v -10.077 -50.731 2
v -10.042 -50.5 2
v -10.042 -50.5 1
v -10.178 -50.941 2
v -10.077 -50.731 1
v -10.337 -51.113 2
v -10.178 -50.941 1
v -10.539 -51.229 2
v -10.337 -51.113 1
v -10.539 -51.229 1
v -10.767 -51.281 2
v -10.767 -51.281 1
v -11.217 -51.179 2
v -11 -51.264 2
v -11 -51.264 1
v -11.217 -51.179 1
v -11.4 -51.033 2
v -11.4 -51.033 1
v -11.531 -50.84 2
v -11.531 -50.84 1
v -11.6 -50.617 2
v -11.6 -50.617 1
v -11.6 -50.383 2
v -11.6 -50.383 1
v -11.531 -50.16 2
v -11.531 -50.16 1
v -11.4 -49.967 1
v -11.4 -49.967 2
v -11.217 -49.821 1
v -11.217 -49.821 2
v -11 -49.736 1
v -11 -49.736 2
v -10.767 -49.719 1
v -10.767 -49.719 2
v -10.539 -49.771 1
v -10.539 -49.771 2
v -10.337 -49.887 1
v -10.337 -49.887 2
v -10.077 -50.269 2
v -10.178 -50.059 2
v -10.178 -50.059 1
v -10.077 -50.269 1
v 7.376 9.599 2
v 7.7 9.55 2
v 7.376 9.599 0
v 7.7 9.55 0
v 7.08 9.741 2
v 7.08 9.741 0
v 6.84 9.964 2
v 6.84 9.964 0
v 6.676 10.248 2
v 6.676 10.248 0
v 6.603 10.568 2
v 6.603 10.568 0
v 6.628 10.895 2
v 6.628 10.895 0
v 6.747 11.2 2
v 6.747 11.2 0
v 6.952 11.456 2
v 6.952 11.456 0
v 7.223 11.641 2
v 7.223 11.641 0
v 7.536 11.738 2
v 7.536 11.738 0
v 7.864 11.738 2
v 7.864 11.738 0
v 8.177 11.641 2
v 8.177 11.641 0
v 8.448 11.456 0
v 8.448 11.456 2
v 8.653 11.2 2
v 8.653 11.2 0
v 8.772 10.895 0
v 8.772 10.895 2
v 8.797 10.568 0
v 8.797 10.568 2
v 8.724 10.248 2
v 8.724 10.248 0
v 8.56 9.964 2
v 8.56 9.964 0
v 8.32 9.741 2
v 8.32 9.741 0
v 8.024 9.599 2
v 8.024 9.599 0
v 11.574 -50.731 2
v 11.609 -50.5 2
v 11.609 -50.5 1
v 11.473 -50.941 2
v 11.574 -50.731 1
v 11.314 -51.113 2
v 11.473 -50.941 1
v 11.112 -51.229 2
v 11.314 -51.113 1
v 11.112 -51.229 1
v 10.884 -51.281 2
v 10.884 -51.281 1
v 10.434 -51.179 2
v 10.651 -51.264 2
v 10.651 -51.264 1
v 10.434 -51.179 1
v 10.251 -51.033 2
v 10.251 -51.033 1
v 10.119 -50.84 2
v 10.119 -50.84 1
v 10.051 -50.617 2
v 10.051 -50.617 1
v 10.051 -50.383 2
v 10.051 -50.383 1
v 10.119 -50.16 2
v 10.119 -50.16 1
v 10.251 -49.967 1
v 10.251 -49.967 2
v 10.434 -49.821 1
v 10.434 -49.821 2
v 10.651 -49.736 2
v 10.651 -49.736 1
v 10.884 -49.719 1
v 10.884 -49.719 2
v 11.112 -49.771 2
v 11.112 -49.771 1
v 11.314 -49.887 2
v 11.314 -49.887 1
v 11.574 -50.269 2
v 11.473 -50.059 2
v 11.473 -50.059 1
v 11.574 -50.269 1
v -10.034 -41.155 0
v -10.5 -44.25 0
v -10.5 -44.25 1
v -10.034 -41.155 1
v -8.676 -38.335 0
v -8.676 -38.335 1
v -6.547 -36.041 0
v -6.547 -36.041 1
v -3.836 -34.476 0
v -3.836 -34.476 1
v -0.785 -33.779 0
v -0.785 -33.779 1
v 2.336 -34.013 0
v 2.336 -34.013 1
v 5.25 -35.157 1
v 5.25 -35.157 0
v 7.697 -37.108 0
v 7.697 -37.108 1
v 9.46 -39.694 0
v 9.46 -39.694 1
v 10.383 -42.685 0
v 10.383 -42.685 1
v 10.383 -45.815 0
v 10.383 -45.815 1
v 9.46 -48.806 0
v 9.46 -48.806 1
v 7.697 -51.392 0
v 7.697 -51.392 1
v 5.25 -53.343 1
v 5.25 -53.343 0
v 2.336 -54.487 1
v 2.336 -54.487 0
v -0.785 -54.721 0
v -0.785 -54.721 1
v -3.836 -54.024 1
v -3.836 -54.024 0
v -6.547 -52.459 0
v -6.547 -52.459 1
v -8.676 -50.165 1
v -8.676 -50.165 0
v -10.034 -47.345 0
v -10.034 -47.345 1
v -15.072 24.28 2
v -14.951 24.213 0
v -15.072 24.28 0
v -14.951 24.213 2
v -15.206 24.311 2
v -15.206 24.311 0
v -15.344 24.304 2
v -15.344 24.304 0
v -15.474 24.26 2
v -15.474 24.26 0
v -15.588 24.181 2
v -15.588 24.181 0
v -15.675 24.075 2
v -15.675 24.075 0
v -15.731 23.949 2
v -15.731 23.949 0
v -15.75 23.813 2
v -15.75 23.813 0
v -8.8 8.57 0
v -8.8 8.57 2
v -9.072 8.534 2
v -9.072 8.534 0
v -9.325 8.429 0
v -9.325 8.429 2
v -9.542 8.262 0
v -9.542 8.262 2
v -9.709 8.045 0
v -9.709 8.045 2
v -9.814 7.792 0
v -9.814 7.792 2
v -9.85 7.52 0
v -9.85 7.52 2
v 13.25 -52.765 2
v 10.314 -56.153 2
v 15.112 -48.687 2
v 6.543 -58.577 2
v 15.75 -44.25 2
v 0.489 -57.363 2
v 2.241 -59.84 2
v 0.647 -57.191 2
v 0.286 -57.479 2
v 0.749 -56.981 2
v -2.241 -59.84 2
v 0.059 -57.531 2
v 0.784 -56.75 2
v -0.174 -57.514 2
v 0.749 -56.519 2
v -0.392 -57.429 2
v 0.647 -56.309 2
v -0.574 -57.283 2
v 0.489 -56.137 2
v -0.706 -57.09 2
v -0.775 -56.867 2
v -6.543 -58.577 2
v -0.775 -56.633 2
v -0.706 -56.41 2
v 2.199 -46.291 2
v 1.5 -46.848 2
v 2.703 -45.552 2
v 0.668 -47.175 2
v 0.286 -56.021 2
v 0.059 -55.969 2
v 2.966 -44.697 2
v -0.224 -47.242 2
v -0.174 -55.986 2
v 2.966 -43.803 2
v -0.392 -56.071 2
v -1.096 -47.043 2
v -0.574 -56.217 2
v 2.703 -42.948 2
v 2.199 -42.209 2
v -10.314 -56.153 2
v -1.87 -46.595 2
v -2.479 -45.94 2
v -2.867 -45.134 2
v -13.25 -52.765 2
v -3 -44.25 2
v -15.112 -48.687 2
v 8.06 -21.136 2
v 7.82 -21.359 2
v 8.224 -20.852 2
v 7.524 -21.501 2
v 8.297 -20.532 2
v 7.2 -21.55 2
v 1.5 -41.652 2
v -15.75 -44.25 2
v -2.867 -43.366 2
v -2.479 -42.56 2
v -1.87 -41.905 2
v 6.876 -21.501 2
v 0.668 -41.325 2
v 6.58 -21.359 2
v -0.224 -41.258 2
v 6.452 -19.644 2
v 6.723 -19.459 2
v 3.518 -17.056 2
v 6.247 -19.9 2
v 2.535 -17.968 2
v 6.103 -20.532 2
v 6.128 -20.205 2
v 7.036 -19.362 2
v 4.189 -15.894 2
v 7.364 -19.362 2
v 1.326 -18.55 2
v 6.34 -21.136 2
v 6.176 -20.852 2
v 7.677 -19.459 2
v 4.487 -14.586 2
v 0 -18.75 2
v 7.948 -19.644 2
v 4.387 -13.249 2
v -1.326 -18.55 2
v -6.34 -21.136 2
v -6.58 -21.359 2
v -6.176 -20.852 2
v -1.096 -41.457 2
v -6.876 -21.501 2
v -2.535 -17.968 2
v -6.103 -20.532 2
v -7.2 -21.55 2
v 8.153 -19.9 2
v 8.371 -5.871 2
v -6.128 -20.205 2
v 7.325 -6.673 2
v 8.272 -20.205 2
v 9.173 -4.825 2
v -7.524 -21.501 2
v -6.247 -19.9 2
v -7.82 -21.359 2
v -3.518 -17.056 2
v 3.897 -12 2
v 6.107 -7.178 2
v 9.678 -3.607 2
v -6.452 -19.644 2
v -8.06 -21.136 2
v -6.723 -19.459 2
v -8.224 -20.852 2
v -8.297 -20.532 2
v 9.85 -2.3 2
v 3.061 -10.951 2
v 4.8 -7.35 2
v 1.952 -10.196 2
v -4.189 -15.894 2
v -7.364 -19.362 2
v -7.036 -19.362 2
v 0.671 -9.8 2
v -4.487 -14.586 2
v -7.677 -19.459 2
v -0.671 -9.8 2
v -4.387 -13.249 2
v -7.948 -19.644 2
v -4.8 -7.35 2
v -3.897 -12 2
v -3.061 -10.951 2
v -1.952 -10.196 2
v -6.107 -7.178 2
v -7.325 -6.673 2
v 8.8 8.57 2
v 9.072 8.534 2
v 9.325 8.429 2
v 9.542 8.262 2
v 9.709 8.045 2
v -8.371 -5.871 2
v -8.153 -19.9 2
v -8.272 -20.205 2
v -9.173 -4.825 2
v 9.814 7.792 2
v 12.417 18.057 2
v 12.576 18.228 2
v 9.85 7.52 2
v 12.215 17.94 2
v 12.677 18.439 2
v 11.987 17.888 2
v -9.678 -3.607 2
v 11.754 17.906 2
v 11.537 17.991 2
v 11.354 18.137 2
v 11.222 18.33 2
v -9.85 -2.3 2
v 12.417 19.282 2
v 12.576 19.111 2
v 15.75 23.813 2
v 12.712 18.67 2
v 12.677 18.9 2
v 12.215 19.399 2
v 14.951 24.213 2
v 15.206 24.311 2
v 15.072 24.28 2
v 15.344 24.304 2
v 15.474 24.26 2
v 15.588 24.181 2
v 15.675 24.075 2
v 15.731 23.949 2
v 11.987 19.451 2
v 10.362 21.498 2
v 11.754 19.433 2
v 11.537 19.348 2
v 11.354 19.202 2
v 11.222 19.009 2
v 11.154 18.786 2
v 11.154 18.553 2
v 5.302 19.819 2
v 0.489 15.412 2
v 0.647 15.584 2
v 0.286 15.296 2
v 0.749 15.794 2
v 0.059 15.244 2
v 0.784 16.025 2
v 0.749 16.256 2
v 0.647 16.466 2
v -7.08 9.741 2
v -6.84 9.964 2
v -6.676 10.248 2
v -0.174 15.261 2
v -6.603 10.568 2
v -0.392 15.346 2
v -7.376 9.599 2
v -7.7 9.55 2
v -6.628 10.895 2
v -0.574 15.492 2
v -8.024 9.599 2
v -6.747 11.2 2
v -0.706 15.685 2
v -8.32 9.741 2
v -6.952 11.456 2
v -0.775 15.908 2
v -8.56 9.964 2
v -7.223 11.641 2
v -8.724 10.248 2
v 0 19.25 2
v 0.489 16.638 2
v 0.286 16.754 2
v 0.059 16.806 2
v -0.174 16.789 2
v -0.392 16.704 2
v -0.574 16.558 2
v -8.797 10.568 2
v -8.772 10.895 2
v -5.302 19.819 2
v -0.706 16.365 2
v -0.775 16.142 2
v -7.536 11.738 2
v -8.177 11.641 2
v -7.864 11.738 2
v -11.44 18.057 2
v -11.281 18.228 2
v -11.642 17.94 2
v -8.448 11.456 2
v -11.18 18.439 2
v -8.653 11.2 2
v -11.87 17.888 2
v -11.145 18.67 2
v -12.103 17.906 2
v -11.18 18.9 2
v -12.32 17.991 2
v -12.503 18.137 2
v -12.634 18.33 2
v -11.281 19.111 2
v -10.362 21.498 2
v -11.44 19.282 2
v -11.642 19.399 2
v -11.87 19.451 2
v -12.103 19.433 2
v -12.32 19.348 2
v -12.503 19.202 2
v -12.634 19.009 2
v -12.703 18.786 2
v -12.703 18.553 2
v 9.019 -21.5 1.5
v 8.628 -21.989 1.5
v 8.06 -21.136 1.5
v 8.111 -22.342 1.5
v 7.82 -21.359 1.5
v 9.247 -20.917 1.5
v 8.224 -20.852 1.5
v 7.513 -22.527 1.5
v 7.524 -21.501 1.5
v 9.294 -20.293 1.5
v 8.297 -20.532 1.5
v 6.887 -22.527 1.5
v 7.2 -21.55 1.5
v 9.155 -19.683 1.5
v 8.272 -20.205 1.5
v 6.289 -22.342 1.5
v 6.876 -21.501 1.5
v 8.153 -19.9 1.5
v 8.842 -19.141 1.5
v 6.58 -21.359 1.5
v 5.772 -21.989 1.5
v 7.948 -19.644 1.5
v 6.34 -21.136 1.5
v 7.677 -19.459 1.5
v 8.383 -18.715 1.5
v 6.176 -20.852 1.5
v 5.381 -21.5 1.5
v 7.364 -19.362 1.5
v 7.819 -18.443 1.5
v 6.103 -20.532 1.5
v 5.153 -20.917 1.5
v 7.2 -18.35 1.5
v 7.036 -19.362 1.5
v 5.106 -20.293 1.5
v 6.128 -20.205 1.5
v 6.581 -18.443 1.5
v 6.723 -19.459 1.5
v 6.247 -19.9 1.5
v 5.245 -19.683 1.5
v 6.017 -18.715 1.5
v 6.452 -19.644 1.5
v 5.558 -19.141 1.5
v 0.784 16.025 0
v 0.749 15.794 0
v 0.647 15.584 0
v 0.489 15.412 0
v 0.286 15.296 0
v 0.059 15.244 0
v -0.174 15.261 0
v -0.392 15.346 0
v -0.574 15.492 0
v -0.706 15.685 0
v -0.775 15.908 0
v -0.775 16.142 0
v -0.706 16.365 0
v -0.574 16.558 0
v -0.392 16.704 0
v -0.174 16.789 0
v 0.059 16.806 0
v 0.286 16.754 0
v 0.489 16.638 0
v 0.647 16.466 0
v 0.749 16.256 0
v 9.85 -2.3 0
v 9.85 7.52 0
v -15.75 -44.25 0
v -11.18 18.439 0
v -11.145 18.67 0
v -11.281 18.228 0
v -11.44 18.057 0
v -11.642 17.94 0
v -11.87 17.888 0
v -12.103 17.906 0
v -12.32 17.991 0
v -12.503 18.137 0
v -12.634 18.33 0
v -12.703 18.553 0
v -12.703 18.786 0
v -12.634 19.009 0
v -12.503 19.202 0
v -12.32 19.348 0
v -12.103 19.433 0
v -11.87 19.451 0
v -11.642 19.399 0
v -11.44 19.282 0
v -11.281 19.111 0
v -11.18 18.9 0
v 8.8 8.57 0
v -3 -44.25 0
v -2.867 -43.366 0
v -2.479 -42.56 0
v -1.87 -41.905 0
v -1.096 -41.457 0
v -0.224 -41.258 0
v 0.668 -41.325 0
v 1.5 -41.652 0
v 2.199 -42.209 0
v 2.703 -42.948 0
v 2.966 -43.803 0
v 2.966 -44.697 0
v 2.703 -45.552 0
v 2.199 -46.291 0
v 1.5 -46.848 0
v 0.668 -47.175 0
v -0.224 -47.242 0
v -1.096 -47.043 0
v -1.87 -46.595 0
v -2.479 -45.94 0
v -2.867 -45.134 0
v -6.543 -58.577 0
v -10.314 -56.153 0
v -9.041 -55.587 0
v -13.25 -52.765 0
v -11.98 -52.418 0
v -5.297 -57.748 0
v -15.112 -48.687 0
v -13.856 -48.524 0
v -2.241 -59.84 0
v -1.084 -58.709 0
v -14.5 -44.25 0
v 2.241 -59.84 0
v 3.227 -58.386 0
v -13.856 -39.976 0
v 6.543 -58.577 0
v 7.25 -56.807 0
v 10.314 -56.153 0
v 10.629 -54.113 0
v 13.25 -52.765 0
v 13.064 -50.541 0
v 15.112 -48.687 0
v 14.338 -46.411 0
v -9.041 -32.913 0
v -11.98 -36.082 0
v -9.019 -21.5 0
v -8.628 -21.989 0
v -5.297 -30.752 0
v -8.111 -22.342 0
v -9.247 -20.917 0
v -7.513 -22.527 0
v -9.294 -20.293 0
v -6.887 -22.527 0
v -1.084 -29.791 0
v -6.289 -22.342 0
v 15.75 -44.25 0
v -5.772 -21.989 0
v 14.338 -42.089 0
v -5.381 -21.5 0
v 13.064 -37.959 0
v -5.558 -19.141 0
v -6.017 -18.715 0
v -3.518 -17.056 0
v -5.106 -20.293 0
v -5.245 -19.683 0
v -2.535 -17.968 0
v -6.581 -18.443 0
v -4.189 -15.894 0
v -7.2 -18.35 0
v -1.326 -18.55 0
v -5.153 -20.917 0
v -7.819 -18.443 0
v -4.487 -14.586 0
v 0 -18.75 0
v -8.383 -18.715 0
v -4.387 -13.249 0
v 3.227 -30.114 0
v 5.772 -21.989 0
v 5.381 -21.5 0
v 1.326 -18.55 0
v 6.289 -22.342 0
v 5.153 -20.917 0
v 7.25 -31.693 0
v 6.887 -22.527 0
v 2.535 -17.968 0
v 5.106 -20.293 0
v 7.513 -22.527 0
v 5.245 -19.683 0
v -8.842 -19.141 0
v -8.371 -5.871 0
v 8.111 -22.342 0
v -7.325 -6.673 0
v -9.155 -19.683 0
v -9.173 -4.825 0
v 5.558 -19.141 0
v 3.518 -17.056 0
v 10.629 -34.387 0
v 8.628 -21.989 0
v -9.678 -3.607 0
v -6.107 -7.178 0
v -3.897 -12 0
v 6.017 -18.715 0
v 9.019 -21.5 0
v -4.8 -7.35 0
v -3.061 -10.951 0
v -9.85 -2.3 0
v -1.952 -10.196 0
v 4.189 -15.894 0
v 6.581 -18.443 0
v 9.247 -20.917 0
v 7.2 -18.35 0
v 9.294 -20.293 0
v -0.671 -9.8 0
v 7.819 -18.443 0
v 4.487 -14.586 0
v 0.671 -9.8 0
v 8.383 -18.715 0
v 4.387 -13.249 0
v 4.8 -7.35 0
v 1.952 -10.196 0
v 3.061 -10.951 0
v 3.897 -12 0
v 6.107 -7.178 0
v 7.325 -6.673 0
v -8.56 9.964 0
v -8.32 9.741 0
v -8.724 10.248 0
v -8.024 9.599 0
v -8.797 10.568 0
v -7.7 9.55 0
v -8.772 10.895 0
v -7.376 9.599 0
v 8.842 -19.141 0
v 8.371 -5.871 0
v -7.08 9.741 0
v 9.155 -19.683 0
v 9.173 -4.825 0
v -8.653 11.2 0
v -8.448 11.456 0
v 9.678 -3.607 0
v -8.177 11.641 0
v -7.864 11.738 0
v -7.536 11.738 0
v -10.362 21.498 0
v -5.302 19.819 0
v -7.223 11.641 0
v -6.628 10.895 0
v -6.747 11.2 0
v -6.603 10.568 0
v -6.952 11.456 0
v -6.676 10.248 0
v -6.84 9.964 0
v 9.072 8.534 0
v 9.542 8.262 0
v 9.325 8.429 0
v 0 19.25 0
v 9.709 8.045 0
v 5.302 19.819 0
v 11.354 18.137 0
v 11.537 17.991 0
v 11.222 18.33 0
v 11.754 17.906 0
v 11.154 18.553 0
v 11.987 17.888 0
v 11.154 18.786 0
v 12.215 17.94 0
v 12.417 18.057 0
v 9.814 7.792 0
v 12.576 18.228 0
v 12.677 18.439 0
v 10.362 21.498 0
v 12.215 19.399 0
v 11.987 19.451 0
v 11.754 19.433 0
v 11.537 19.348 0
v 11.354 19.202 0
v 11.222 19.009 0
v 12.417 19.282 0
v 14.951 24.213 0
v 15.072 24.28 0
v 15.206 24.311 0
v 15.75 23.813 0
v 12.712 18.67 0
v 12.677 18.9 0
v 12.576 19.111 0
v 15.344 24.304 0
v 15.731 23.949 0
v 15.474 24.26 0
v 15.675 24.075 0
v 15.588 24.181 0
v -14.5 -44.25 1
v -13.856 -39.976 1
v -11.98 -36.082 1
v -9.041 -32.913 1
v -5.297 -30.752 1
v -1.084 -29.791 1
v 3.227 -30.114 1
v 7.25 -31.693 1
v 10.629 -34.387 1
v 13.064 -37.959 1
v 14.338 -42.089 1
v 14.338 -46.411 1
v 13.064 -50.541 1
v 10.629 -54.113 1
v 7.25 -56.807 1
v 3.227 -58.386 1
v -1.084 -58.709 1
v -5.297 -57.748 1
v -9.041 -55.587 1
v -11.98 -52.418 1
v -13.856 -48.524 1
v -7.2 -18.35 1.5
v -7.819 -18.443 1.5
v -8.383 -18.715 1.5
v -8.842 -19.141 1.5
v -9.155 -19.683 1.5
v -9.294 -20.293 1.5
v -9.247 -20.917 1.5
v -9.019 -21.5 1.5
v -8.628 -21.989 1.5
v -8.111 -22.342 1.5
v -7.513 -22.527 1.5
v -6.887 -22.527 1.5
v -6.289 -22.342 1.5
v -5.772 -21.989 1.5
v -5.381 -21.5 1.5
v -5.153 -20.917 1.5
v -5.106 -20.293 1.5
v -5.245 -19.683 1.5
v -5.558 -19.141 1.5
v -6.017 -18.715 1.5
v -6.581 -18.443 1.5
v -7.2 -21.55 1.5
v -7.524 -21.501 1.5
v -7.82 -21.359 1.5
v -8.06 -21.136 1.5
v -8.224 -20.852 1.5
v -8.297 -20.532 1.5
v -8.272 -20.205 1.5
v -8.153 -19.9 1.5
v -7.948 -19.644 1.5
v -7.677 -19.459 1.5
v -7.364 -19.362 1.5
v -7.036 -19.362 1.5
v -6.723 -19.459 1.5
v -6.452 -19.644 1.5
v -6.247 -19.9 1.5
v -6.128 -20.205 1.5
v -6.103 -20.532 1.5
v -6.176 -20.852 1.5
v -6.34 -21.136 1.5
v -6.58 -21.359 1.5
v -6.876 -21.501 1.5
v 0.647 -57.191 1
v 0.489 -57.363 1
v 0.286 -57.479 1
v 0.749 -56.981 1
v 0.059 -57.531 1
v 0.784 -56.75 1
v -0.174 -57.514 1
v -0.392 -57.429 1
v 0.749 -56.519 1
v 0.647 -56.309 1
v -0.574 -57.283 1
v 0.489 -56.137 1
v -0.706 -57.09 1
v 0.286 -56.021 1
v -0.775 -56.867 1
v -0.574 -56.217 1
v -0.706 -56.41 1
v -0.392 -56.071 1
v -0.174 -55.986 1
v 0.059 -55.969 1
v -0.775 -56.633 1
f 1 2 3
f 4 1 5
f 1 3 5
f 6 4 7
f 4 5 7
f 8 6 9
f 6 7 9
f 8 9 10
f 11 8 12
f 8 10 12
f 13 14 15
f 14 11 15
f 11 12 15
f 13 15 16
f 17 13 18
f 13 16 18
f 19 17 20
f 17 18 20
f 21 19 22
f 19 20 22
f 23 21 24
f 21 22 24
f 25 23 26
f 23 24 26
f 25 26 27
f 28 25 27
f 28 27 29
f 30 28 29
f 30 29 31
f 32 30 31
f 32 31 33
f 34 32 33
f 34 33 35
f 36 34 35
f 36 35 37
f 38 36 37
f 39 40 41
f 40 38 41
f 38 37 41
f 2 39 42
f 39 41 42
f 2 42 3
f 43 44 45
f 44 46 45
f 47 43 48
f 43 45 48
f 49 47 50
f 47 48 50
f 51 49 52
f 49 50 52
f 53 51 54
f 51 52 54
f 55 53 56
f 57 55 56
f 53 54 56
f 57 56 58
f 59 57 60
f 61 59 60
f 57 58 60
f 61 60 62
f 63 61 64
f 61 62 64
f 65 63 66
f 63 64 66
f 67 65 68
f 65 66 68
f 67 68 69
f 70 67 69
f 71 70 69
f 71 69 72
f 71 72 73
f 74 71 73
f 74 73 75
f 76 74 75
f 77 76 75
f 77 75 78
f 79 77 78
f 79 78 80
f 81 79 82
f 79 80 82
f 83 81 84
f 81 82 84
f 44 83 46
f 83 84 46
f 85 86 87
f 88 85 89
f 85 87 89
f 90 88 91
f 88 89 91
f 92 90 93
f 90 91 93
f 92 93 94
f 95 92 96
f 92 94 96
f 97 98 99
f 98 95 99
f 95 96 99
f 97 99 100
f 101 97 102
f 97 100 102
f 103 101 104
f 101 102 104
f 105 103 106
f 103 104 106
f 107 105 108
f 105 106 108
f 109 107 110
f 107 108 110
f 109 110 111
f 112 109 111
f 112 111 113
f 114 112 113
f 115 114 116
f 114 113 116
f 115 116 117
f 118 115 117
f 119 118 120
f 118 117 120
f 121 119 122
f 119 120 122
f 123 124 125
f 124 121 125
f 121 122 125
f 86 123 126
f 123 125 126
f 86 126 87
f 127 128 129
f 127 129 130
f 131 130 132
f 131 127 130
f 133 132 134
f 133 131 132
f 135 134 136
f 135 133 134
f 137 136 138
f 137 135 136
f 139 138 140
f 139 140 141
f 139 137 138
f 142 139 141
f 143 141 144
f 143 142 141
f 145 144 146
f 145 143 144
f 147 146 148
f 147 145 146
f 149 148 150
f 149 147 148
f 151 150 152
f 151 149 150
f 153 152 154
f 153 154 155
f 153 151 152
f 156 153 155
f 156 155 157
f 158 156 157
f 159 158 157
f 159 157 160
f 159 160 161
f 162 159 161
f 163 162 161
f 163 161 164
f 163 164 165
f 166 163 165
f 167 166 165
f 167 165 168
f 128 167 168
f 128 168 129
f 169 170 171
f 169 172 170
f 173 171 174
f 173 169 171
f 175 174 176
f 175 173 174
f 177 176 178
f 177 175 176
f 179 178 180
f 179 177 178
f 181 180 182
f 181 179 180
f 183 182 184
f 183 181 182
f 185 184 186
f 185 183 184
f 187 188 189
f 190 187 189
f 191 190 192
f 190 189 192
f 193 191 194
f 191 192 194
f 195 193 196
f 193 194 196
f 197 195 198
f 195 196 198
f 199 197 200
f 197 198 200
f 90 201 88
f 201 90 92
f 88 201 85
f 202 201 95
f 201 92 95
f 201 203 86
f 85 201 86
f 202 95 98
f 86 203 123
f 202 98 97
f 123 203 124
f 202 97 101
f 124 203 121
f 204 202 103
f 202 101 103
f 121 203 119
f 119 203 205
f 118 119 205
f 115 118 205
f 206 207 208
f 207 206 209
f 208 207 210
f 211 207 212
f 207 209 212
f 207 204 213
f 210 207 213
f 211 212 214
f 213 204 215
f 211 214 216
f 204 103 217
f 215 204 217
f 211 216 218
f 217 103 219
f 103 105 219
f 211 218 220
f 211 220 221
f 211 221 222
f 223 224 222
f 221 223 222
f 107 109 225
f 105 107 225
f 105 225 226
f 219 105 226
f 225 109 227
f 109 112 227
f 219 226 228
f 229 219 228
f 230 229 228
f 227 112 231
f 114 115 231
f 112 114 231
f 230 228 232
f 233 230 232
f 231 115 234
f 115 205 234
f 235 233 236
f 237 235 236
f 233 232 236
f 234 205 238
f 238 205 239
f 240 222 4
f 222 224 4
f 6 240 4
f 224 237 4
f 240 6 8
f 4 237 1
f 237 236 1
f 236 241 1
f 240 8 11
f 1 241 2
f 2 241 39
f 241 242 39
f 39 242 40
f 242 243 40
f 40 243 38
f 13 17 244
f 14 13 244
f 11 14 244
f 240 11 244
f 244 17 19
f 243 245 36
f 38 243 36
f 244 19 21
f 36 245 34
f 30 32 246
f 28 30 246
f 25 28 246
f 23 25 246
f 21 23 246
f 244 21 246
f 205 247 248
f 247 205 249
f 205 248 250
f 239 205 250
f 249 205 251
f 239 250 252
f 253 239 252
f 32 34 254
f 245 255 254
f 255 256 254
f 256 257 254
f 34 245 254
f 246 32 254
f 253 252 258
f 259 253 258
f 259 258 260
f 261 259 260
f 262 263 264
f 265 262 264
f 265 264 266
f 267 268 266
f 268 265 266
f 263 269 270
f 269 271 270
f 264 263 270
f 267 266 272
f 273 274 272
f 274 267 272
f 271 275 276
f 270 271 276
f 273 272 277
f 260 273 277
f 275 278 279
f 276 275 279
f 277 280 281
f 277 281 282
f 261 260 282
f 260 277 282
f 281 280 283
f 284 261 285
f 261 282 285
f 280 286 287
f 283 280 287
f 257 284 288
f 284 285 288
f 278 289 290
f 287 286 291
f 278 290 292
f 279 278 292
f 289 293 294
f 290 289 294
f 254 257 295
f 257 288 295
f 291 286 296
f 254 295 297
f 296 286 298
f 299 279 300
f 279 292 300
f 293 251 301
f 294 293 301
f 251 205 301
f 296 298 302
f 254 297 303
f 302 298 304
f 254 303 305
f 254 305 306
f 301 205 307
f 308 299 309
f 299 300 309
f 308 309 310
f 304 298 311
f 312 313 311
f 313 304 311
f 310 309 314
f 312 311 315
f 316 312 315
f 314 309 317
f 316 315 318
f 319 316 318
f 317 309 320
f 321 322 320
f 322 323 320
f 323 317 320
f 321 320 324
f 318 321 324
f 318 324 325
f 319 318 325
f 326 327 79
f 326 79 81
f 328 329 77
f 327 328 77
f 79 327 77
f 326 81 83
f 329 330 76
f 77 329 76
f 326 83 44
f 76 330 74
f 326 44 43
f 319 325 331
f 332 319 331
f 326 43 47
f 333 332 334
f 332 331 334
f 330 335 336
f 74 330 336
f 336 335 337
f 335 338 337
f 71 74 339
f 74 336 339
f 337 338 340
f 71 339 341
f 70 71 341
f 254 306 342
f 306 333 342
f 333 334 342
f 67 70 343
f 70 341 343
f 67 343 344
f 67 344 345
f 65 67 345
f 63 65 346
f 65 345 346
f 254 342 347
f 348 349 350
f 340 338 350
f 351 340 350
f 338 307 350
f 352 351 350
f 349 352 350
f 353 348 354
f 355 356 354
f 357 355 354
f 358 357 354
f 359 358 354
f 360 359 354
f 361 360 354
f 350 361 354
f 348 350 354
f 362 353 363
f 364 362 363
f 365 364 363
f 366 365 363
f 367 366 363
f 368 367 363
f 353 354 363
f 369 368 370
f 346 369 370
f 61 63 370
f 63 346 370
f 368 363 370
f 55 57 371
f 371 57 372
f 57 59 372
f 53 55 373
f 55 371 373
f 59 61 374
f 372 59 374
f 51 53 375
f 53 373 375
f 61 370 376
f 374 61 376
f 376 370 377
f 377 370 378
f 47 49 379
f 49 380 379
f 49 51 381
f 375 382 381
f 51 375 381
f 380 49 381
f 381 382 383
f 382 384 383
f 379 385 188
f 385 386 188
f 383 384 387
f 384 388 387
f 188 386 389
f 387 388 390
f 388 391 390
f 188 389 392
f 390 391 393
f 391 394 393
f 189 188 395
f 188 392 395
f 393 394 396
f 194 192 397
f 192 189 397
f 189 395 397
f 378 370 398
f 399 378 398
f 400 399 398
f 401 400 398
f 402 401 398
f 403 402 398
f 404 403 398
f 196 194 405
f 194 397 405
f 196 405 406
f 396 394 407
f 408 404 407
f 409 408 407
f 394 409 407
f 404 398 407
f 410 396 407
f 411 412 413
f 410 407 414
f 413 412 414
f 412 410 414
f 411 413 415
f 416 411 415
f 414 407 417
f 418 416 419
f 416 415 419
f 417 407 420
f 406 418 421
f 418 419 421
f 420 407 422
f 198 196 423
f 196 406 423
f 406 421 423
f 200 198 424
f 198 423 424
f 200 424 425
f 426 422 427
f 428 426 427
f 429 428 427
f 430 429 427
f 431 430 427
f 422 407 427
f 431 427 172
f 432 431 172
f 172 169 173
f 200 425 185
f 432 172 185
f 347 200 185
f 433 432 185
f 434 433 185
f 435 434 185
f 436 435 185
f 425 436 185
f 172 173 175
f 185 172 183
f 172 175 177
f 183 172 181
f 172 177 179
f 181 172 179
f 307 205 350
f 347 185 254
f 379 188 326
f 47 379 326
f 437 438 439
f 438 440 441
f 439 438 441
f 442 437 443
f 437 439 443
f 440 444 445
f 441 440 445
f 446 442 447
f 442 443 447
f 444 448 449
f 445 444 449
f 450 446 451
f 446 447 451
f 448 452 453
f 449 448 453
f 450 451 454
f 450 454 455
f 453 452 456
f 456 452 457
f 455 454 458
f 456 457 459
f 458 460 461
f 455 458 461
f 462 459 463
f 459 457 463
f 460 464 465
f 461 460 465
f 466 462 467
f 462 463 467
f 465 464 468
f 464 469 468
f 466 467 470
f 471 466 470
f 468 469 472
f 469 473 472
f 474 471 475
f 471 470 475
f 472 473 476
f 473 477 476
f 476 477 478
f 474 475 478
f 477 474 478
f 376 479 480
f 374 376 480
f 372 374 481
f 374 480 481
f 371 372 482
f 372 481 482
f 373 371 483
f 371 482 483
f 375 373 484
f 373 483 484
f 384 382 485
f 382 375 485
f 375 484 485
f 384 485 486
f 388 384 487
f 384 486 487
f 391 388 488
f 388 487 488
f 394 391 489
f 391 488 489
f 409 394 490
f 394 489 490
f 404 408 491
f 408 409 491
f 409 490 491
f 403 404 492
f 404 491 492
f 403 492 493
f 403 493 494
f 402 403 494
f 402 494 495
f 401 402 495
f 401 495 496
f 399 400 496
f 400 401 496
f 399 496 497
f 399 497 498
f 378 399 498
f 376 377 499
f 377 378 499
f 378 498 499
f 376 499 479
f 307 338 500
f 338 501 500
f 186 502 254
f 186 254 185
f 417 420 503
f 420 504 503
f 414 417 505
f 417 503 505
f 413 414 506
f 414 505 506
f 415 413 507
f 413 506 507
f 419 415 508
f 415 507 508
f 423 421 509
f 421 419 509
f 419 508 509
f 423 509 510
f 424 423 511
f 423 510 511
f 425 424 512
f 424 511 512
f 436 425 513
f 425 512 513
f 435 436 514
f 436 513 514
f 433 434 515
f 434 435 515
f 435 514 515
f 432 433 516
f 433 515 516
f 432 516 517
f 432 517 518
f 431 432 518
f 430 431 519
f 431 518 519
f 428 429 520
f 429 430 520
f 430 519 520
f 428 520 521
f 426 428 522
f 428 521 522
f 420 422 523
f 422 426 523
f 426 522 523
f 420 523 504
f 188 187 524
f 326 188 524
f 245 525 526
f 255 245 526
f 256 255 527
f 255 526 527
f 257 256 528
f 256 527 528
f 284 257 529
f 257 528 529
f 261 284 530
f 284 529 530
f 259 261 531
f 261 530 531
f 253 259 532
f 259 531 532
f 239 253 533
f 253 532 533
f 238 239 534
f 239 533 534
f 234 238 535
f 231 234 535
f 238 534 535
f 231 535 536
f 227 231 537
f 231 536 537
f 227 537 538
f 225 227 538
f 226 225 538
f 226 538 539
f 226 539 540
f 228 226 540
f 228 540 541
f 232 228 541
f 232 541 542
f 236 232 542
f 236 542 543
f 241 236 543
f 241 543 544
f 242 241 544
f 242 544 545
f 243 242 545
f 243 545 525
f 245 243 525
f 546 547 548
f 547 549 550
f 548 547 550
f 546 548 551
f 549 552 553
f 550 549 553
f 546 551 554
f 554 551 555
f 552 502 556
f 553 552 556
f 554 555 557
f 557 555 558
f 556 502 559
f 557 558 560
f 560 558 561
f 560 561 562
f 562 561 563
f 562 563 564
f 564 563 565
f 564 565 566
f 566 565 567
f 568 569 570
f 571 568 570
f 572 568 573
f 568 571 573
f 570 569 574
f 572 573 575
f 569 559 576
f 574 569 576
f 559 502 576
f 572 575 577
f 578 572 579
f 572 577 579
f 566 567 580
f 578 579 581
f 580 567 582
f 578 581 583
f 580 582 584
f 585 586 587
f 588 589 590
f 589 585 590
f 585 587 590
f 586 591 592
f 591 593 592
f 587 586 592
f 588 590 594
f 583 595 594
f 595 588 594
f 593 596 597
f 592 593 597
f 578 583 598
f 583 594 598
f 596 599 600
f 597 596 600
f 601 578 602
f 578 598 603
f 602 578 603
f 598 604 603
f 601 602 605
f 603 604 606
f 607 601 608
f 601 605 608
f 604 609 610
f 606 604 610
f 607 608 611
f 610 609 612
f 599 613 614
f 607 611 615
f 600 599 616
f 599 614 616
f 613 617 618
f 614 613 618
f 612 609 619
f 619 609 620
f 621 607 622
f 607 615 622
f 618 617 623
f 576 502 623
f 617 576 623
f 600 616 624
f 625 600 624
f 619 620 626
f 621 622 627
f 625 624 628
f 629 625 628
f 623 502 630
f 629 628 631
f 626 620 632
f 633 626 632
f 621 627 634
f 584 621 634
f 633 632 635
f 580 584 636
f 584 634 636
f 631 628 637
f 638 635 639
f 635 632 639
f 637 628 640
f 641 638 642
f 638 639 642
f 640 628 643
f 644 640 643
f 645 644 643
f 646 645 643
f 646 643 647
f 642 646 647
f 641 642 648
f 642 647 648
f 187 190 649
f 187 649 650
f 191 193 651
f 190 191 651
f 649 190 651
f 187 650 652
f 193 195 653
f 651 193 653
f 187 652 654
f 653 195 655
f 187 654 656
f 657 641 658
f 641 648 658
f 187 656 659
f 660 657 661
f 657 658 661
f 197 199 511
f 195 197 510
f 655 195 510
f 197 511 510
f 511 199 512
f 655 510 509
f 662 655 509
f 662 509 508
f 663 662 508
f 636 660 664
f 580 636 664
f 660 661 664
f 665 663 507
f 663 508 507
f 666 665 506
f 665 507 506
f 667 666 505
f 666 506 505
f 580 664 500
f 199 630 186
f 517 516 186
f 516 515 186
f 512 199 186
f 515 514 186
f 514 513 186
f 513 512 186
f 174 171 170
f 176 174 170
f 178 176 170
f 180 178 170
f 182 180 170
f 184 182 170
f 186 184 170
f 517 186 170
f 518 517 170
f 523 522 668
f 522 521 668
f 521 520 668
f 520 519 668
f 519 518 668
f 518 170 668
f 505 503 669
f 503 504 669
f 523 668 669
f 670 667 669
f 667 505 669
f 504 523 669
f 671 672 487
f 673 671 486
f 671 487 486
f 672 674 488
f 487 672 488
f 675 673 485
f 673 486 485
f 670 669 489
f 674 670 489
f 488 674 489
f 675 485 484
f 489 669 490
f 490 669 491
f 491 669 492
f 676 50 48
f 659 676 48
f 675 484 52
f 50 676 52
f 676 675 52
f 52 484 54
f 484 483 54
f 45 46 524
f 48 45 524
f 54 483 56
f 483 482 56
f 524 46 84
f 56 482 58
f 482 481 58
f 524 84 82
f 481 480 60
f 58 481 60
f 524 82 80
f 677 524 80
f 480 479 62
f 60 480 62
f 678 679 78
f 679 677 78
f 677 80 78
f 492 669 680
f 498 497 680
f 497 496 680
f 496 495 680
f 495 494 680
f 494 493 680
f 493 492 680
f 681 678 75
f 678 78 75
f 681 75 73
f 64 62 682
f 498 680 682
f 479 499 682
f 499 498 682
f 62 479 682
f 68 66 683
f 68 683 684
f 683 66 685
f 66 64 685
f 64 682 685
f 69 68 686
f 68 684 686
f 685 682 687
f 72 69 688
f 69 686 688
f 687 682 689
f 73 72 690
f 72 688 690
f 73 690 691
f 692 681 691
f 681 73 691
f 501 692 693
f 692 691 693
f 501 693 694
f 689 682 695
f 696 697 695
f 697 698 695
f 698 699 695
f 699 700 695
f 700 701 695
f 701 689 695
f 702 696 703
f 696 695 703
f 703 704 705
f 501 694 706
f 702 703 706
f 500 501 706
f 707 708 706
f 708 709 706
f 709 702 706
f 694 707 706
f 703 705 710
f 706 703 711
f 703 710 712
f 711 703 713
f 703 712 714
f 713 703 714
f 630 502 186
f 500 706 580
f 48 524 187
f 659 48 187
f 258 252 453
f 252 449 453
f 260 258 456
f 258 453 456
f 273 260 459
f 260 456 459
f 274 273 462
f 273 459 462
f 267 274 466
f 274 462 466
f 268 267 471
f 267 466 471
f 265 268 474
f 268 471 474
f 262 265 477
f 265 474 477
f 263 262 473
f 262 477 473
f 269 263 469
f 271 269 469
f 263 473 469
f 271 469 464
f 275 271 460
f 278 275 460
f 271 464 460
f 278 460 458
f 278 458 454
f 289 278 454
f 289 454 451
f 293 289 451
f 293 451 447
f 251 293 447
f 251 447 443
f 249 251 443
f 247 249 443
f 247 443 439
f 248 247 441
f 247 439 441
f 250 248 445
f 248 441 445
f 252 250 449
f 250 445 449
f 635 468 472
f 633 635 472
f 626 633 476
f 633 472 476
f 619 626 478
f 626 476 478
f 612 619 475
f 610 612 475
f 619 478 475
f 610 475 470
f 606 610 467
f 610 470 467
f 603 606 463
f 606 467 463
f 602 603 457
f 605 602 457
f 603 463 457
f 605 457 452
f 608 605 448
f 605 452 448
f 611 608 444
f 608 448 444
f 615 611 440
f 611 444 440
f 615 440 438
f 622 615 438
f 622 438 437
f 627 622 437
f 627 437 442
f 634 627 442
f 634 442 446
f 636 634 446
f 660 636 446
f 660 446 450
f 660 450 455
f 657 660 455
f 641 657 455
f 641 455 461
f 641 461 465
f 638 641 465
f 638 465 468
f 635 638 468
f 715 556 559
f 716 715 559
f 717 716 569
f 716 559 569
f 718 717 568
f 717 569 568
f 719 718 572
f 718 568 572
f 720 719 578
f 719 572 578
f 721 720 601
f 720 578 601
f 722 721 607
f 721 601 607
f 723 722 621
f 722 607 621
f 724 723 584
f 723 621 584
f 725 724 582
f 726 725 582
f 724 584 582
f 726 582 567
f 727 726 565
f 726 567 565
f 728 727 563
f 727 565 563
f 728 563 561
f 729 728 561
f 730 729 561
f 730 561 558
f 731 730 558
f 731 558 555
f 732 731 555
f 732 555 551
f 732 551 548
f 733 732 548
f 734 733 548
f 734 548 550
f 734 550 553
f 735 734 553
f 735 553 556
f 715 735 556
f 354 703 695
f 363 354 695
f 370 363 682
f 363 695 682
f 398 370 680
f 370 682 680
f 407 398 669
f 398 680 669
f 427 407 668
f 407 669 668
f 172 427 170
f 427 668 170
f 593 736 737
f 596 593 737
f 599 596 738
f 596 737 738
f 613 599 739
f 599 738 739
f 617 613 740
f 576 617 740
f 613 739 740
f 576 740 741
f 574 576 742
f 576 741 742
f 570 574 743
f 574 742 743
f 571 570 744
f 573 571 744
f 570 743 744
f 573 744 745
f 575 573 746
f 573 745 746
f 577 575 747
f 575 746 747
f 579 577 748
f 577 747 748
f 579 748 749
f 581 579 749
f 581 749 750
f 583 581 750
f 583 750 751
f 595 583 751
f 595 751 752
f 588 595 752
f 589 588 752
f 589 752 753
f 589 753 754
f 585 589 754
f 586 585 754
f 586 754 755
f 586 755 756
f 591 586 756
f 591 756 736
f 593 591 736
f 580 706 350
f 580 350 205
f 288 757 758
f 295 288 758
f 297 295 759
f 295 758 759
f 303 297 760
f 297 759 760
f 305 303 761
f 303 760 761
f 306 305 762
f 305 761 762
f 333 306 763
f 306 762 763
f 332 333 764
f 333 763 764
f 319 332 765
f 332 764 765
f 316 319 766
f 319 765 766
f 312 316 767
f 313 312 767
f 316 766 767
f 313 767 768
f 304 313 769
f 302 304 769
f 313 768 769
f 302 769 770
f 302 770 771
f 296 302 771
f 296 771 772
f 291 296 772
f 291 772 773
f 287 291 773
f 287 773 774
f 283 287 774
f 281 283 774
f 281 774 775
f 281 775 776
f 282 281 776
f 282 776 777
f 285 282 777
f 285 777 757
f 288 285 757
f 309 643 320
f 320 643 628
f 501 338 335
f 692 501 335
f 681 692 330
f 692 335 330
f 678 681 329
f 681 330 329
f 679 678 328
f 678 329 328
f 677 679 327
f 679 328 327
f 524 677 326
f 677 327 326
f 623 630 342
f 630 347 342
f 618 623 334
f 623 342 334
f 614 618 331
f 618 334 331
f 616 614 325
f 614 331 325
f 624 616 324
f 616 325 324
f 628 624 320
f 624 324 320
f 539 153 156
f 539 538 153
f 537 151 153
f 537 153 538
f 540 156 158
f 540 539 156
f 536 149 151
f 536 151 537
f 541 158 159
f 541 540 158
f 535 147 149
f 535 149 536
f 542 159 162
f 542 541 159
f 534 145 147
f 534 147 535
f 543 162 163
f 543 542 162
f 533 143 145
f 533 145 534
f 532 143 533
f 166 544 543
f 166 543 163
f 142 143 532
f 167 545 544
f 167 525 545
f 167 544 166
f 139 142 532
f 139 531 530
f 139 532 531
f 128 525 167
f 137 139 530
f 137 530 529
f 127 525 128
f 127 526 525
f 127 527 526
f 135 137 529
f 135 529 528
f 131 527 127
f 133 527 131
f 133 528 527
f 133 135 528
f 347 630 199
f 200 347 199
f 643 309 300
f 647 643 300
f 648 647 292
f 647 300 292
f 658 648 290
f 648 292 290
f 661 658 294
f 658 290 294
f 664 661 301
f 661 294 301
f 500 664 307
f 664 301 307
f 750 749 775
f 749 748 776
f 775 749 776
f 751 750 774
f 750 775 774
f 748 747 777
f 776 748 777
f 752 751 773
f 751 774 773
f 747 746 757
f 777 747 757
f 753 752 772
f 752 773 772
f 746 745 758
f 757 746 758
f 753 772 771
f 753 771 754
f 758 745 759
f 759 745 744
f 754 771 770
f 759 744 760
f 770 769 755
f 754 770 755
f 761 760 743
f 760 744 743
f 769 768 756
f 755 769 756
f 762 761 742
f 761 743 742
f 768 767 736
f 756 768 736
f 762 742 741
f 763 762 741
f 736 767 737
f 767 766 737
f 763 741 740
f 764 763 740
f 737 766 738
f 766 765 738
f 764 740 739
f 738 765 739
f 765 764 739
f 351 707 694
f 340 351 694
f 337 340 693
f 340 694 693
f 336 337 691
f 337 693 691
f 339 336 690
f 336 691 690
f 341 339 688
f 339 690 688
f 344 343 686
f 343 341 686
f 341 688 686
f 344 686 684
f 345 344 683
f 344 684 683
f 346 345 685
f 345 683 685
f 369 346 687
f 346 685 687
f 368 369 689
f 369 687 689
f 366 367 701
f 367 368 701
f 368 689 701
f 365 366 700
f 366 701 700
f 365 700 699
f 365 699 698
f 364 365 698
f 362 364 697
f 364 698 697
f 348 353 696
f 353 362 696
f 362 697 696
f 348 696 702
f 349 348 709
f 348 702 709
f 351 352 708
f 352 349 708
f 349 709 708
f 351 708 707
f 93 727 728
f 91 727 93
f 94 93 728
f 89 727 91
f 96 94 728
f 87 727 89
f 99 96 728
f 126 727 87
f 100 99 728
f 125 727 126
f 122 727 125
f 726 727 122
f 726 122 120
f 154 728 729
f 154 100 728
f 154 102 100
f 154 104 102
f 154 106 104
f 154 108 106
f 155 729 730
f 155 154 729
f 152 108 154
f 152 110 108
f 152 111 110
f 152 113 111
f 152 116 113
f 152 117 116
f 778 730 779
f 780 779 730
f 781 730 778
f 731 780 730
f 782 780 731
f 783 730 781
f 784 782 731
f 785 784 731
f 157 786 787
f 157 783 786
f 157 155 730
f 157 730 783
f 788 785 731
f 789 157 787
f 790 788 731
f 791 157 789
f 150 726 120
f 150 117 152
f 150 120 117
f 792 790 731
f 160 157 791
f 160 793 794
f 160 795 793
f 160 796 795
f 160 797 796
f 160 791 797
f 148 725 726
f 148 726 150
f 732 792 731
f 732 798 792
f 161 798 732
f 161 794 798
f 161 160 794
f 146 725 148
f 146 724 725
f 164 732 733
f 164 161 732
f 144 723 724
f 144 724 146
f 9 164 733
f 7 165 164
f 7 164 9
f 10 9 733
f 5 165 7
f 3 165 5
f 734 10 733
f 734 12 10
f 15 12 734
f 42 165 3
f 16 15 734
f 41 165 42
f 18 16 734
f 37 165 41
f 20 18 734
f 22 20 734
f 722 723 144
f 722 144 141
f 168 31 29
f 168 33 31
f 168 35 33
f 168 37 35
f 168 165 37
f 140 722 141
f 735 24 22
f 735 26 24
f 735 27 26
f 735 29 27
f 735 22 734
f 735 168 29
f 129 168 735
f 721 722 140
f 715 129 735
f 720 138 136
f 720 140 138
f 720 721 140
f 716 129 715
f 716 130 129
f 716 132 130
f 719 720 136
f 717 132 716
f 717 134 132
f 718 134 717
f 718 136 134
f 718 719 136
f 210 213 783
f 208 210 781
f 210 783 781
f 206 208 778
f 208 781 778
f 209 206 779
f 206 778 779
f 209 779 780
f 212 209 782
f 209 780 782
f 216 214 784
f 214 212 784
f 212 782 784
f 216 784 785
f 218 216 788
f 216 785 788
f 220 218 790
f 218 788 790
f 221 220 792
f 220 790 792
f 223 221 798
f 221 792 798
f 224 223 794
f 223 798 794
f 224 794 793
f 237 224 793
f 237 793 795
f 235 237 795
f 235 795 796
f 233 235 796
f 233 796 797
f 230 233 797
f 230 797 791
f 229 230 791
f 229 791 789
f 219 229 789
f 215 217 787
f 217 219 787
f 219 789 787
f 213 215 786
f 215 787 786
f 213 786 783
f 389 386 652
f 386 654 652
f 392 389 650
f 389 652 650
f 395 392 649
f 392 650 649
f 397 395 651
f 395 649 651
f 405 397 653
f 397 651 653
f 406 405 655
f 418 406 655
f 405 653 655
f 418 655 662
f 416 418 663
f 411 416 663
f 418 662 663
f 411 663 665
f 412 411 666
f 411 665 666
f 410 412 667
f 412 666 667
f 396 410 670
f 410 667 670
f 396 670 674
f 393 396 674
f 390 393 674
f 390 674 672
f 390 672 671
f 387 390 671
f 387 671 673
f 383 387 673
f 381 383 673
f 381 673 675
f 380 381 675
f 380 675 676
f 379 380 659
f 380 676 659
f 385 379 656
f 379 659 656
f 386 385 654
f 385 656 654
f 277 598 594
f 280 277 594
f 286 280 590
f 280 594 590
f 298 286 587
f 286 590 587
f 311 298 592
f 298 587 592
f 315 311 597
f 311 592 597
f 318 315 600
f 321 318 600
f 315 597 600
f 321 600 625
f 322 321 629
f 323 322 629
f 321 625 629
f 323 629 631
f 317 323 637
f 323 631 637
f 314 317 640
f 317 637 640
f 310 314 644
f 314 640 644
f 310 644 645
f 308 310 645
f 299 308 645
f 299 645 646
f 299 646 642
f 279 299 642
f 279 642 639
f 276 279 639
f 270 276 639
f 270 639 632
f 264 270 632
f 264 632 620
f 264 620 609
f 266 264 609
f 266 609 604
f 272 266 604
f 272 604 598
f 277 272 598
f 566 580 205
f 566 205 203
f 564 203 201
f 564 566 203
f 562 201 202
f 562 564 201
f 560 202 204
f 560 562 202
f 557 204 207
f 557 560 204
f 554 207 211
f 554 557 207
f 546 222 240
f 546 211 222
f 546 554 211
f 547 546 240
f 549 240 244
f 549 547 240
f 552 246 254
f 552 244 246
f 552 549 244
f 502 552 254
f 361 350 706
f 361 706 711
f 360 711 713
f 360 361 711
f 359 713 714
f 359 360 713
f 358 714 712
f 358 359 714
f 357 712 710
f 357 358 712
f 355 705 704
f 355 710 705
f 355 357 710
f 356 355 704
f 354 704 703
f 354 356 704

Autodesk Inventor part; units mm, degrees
ref_plane "YZ Plane" through (0, 0, 0) normal (1, 0, 0) x (0, 1, 0)
ref_plane "XZ Plane" through (0, 0, 0) normal (0, 1, 0) x (-1, 0, 0)
ref_plane "XY Plane" through (0, 0, 0) normal (0, 0, 1) x (1, 0, 0)
sketch "スケッチ1" plane through (0, 0, 0) normal (0, 0, 1) x (1, 0, 0)
  circle A0 centre (-10.8253, -50.5) radius 0.7835
  circle A1 centre (0, -56.75) radius 0.7835
  circle A2 centre (10.8253, -50.5) radius 0.7835
  circle A3 centre (11.9284, 18.6695) radius 0.7835
  circle A4 centre (0, 16.025) radius 0.7835
  circle A5 centre (-11.9284, 18.6695) radius 0.7835
  line L0 (-9.85, -18.05) -> (-9.85, -7.35)
  arc A6 (-6.8, 12.8) -> (-9.85, 9.75) centre (-6.8, 9.75) ccw
  line L1 (-6.8, 12.8) -> (6.8, 12.8)
  arc A7 (9.85, 9.75) -> (6.8, 12.8) centre (6.8, 9.75) ccw
  line L2 (9.85, 9.75) -> (9.85, 8.57)
  arc A8 (4.8, -23.1) -> (9.85, -18.05) centre (4.8, -18.05) ccw
  line L3 (4.8, -23.1) -> (-4.8, -23.1)
  arc A9 (-9.85, -18.05) -> (-4.8, -23.1) centre (-4.8, -18.05) ccw
  circle A10 centre (0, -44.25) radius 4
  arc A11 (-15.75, 24.8351) -> (15.75, 24.8351) centre (0, 44.25) ccw
  line L4 (-15.75, -44.25) -> (-15.75, 24.8351)
  arc A12 (-15.75, -44.25) -> (15.75, -44.25) centre (0, -44.25) ccw
  line L5 (15.75, 24.8351) -> (15.75, -44.25)
  line L6 (-9.85, 8.57) -> (9.85, 8.57)
  line L7 (9.85, 8.57) -> (9.85, -7.35)
  line L8 (9.85, -7.35) -> (-9.85, -7.35)
  line L9 (-9.85, -7.35) -> (-9.85, 8.57)
  line L10 (9.85, 8.57) -> (9.85, -7.35)
  line L11 (-9.85, 8.57) -> (-9.85, 9.75)
  line L12 (-9.85, -7.35) -> (-9.85, 8.57)
  line L13 (9.85, -7.35) -> (9.85, -18.05)
  point P0 (0, 0)
  point P1 (0, 0)
  dimension "d3" = 4.23
  dimension "d4" = 15.75
extrude "押し出し2" add sketch "スケッチ1" along normal blind 2 contours L0 L8 L13 A8 L3 A9 | L11 A6 L1 A7 L2 L6 | A11 L5 A12 L4
sketch "スケッチ2" plane through (0, 0, 2) normal (0, 0, 1) x (1, 0, 0)
  line L0 (9.85, -7.35) -> (-9.85, -7.35) projected
  line L1 (15.75, 24.8351) -> (15.75, -44.25) projected
  line L2 (-15.75, -44.25) -> (-15.75, 24.8351) projected
  line L3 (0, 18.6695) -> (0, -60)
  point P0 (0, 0)
  point P1 (0, 0)
  point P2 (-7.7, 10.65)
  point P3 (-7.2, -20.45)
  point P4 (7.2, -20.45)
  point P5 (7.7, 10.65)
  point P6 (0, -14.25)
  dimension "d10" = 31.1
  dimension "d11" = 31.1
  dimension "d12" = 15.4
  dimension "d13" = 14.4
  dimension "d14" = 15.4
  dimension "d15" = 31.5
  dimension "d16" = 14.4
  dimension "d26" = 6.9
  dimension "d27" = 6.2
  dimension "d28" = 6.2
hole "Hole2" at (7.7, 10.65, 2) at (7.2, -20.45, 2) at (-7.2, -20.45, 2) at (-7.7, 10.65, 2) at (0, -14.25, 2) direction (0, 0, -1) diameter 2.2 depth 8 tip angle 118
sketch "スケッチ4" plane through (0, 0, 2) normal (0, 0, 1) x (1, 0, 0)
  point P0 (0, 0)
  point P1 (0, -14.25)
hole "Hole3" at (0, -14.25, 2) direction (0, 0, -1) diameter 9 depth 8 tip angle 118
fillet "フィレット3" radius 1.05 2 edges at (-9.85, 8.57, 1) (9.85, 8.57, 1)
fillet "フィレット4" radius 5.05 2 edges at (-9.85, -7.35, 1) (9.85, -7.35, 1)
sketch "スケッチ6" plane through (0, 0, 0) normal (0, 0, -1) x (-1, 0, 0)
  circle A0 centre (-10.8253, -50.5) radius 0.7835 projected
  circle A1 centre (0, -56.75) radius 0.7835 projected
  circle A2 centre (10.8253, -50.5) radius 0.7835 projected
  circle A3 centre (0, -44.25) radius 10.5
  circle A4 centre (0, -44.25) radius 14.5
  point P0 (0, 0)
  dimension "d50" = 21
  dimension "d51" = 29
extrude "押し出し4" cut sketch "スケッチ6" against normal blind 1
fillet "フィレット5" radius 0.5 2 edges at (-15.75, 24.8351, 1) (15.75, 24.8351, 1)
sketch "スケッチ8" plane through (0, 0, 0) normal (0, 0, -1) x (-1, 0, 0)
  circle A0 centre (-7.2, -20.45) radius 1.1 projected
  circle A1 centre (7.2, -20.45) radius 1.1 projected
  point P0 (0, 0)
hole "Hole5" at (7.2, -20.45, 0) at (-7.2, -20.45, 0) direction (0, 0, 1) diameter 4.2 depth 1.5
sketch "スケッチ9" plane through (0, -44.25, 0) normal (0, 0, -1) x (-1, 0, 0)
  circle A0 centre (0, 0) radius 4 projected
  circle A1 centre (0, 0) radius 3
  point P0 (0, 44.25)
  dimension "d69" = 6
extrude "押し出し6" add sketch "スケッチ9" against normal blind 2
equation "\"d11\" = d10"
equation "\"d14\" = d12"
equation "\"d16\" = d13"
properties part number "JointC2cover_2nd"
